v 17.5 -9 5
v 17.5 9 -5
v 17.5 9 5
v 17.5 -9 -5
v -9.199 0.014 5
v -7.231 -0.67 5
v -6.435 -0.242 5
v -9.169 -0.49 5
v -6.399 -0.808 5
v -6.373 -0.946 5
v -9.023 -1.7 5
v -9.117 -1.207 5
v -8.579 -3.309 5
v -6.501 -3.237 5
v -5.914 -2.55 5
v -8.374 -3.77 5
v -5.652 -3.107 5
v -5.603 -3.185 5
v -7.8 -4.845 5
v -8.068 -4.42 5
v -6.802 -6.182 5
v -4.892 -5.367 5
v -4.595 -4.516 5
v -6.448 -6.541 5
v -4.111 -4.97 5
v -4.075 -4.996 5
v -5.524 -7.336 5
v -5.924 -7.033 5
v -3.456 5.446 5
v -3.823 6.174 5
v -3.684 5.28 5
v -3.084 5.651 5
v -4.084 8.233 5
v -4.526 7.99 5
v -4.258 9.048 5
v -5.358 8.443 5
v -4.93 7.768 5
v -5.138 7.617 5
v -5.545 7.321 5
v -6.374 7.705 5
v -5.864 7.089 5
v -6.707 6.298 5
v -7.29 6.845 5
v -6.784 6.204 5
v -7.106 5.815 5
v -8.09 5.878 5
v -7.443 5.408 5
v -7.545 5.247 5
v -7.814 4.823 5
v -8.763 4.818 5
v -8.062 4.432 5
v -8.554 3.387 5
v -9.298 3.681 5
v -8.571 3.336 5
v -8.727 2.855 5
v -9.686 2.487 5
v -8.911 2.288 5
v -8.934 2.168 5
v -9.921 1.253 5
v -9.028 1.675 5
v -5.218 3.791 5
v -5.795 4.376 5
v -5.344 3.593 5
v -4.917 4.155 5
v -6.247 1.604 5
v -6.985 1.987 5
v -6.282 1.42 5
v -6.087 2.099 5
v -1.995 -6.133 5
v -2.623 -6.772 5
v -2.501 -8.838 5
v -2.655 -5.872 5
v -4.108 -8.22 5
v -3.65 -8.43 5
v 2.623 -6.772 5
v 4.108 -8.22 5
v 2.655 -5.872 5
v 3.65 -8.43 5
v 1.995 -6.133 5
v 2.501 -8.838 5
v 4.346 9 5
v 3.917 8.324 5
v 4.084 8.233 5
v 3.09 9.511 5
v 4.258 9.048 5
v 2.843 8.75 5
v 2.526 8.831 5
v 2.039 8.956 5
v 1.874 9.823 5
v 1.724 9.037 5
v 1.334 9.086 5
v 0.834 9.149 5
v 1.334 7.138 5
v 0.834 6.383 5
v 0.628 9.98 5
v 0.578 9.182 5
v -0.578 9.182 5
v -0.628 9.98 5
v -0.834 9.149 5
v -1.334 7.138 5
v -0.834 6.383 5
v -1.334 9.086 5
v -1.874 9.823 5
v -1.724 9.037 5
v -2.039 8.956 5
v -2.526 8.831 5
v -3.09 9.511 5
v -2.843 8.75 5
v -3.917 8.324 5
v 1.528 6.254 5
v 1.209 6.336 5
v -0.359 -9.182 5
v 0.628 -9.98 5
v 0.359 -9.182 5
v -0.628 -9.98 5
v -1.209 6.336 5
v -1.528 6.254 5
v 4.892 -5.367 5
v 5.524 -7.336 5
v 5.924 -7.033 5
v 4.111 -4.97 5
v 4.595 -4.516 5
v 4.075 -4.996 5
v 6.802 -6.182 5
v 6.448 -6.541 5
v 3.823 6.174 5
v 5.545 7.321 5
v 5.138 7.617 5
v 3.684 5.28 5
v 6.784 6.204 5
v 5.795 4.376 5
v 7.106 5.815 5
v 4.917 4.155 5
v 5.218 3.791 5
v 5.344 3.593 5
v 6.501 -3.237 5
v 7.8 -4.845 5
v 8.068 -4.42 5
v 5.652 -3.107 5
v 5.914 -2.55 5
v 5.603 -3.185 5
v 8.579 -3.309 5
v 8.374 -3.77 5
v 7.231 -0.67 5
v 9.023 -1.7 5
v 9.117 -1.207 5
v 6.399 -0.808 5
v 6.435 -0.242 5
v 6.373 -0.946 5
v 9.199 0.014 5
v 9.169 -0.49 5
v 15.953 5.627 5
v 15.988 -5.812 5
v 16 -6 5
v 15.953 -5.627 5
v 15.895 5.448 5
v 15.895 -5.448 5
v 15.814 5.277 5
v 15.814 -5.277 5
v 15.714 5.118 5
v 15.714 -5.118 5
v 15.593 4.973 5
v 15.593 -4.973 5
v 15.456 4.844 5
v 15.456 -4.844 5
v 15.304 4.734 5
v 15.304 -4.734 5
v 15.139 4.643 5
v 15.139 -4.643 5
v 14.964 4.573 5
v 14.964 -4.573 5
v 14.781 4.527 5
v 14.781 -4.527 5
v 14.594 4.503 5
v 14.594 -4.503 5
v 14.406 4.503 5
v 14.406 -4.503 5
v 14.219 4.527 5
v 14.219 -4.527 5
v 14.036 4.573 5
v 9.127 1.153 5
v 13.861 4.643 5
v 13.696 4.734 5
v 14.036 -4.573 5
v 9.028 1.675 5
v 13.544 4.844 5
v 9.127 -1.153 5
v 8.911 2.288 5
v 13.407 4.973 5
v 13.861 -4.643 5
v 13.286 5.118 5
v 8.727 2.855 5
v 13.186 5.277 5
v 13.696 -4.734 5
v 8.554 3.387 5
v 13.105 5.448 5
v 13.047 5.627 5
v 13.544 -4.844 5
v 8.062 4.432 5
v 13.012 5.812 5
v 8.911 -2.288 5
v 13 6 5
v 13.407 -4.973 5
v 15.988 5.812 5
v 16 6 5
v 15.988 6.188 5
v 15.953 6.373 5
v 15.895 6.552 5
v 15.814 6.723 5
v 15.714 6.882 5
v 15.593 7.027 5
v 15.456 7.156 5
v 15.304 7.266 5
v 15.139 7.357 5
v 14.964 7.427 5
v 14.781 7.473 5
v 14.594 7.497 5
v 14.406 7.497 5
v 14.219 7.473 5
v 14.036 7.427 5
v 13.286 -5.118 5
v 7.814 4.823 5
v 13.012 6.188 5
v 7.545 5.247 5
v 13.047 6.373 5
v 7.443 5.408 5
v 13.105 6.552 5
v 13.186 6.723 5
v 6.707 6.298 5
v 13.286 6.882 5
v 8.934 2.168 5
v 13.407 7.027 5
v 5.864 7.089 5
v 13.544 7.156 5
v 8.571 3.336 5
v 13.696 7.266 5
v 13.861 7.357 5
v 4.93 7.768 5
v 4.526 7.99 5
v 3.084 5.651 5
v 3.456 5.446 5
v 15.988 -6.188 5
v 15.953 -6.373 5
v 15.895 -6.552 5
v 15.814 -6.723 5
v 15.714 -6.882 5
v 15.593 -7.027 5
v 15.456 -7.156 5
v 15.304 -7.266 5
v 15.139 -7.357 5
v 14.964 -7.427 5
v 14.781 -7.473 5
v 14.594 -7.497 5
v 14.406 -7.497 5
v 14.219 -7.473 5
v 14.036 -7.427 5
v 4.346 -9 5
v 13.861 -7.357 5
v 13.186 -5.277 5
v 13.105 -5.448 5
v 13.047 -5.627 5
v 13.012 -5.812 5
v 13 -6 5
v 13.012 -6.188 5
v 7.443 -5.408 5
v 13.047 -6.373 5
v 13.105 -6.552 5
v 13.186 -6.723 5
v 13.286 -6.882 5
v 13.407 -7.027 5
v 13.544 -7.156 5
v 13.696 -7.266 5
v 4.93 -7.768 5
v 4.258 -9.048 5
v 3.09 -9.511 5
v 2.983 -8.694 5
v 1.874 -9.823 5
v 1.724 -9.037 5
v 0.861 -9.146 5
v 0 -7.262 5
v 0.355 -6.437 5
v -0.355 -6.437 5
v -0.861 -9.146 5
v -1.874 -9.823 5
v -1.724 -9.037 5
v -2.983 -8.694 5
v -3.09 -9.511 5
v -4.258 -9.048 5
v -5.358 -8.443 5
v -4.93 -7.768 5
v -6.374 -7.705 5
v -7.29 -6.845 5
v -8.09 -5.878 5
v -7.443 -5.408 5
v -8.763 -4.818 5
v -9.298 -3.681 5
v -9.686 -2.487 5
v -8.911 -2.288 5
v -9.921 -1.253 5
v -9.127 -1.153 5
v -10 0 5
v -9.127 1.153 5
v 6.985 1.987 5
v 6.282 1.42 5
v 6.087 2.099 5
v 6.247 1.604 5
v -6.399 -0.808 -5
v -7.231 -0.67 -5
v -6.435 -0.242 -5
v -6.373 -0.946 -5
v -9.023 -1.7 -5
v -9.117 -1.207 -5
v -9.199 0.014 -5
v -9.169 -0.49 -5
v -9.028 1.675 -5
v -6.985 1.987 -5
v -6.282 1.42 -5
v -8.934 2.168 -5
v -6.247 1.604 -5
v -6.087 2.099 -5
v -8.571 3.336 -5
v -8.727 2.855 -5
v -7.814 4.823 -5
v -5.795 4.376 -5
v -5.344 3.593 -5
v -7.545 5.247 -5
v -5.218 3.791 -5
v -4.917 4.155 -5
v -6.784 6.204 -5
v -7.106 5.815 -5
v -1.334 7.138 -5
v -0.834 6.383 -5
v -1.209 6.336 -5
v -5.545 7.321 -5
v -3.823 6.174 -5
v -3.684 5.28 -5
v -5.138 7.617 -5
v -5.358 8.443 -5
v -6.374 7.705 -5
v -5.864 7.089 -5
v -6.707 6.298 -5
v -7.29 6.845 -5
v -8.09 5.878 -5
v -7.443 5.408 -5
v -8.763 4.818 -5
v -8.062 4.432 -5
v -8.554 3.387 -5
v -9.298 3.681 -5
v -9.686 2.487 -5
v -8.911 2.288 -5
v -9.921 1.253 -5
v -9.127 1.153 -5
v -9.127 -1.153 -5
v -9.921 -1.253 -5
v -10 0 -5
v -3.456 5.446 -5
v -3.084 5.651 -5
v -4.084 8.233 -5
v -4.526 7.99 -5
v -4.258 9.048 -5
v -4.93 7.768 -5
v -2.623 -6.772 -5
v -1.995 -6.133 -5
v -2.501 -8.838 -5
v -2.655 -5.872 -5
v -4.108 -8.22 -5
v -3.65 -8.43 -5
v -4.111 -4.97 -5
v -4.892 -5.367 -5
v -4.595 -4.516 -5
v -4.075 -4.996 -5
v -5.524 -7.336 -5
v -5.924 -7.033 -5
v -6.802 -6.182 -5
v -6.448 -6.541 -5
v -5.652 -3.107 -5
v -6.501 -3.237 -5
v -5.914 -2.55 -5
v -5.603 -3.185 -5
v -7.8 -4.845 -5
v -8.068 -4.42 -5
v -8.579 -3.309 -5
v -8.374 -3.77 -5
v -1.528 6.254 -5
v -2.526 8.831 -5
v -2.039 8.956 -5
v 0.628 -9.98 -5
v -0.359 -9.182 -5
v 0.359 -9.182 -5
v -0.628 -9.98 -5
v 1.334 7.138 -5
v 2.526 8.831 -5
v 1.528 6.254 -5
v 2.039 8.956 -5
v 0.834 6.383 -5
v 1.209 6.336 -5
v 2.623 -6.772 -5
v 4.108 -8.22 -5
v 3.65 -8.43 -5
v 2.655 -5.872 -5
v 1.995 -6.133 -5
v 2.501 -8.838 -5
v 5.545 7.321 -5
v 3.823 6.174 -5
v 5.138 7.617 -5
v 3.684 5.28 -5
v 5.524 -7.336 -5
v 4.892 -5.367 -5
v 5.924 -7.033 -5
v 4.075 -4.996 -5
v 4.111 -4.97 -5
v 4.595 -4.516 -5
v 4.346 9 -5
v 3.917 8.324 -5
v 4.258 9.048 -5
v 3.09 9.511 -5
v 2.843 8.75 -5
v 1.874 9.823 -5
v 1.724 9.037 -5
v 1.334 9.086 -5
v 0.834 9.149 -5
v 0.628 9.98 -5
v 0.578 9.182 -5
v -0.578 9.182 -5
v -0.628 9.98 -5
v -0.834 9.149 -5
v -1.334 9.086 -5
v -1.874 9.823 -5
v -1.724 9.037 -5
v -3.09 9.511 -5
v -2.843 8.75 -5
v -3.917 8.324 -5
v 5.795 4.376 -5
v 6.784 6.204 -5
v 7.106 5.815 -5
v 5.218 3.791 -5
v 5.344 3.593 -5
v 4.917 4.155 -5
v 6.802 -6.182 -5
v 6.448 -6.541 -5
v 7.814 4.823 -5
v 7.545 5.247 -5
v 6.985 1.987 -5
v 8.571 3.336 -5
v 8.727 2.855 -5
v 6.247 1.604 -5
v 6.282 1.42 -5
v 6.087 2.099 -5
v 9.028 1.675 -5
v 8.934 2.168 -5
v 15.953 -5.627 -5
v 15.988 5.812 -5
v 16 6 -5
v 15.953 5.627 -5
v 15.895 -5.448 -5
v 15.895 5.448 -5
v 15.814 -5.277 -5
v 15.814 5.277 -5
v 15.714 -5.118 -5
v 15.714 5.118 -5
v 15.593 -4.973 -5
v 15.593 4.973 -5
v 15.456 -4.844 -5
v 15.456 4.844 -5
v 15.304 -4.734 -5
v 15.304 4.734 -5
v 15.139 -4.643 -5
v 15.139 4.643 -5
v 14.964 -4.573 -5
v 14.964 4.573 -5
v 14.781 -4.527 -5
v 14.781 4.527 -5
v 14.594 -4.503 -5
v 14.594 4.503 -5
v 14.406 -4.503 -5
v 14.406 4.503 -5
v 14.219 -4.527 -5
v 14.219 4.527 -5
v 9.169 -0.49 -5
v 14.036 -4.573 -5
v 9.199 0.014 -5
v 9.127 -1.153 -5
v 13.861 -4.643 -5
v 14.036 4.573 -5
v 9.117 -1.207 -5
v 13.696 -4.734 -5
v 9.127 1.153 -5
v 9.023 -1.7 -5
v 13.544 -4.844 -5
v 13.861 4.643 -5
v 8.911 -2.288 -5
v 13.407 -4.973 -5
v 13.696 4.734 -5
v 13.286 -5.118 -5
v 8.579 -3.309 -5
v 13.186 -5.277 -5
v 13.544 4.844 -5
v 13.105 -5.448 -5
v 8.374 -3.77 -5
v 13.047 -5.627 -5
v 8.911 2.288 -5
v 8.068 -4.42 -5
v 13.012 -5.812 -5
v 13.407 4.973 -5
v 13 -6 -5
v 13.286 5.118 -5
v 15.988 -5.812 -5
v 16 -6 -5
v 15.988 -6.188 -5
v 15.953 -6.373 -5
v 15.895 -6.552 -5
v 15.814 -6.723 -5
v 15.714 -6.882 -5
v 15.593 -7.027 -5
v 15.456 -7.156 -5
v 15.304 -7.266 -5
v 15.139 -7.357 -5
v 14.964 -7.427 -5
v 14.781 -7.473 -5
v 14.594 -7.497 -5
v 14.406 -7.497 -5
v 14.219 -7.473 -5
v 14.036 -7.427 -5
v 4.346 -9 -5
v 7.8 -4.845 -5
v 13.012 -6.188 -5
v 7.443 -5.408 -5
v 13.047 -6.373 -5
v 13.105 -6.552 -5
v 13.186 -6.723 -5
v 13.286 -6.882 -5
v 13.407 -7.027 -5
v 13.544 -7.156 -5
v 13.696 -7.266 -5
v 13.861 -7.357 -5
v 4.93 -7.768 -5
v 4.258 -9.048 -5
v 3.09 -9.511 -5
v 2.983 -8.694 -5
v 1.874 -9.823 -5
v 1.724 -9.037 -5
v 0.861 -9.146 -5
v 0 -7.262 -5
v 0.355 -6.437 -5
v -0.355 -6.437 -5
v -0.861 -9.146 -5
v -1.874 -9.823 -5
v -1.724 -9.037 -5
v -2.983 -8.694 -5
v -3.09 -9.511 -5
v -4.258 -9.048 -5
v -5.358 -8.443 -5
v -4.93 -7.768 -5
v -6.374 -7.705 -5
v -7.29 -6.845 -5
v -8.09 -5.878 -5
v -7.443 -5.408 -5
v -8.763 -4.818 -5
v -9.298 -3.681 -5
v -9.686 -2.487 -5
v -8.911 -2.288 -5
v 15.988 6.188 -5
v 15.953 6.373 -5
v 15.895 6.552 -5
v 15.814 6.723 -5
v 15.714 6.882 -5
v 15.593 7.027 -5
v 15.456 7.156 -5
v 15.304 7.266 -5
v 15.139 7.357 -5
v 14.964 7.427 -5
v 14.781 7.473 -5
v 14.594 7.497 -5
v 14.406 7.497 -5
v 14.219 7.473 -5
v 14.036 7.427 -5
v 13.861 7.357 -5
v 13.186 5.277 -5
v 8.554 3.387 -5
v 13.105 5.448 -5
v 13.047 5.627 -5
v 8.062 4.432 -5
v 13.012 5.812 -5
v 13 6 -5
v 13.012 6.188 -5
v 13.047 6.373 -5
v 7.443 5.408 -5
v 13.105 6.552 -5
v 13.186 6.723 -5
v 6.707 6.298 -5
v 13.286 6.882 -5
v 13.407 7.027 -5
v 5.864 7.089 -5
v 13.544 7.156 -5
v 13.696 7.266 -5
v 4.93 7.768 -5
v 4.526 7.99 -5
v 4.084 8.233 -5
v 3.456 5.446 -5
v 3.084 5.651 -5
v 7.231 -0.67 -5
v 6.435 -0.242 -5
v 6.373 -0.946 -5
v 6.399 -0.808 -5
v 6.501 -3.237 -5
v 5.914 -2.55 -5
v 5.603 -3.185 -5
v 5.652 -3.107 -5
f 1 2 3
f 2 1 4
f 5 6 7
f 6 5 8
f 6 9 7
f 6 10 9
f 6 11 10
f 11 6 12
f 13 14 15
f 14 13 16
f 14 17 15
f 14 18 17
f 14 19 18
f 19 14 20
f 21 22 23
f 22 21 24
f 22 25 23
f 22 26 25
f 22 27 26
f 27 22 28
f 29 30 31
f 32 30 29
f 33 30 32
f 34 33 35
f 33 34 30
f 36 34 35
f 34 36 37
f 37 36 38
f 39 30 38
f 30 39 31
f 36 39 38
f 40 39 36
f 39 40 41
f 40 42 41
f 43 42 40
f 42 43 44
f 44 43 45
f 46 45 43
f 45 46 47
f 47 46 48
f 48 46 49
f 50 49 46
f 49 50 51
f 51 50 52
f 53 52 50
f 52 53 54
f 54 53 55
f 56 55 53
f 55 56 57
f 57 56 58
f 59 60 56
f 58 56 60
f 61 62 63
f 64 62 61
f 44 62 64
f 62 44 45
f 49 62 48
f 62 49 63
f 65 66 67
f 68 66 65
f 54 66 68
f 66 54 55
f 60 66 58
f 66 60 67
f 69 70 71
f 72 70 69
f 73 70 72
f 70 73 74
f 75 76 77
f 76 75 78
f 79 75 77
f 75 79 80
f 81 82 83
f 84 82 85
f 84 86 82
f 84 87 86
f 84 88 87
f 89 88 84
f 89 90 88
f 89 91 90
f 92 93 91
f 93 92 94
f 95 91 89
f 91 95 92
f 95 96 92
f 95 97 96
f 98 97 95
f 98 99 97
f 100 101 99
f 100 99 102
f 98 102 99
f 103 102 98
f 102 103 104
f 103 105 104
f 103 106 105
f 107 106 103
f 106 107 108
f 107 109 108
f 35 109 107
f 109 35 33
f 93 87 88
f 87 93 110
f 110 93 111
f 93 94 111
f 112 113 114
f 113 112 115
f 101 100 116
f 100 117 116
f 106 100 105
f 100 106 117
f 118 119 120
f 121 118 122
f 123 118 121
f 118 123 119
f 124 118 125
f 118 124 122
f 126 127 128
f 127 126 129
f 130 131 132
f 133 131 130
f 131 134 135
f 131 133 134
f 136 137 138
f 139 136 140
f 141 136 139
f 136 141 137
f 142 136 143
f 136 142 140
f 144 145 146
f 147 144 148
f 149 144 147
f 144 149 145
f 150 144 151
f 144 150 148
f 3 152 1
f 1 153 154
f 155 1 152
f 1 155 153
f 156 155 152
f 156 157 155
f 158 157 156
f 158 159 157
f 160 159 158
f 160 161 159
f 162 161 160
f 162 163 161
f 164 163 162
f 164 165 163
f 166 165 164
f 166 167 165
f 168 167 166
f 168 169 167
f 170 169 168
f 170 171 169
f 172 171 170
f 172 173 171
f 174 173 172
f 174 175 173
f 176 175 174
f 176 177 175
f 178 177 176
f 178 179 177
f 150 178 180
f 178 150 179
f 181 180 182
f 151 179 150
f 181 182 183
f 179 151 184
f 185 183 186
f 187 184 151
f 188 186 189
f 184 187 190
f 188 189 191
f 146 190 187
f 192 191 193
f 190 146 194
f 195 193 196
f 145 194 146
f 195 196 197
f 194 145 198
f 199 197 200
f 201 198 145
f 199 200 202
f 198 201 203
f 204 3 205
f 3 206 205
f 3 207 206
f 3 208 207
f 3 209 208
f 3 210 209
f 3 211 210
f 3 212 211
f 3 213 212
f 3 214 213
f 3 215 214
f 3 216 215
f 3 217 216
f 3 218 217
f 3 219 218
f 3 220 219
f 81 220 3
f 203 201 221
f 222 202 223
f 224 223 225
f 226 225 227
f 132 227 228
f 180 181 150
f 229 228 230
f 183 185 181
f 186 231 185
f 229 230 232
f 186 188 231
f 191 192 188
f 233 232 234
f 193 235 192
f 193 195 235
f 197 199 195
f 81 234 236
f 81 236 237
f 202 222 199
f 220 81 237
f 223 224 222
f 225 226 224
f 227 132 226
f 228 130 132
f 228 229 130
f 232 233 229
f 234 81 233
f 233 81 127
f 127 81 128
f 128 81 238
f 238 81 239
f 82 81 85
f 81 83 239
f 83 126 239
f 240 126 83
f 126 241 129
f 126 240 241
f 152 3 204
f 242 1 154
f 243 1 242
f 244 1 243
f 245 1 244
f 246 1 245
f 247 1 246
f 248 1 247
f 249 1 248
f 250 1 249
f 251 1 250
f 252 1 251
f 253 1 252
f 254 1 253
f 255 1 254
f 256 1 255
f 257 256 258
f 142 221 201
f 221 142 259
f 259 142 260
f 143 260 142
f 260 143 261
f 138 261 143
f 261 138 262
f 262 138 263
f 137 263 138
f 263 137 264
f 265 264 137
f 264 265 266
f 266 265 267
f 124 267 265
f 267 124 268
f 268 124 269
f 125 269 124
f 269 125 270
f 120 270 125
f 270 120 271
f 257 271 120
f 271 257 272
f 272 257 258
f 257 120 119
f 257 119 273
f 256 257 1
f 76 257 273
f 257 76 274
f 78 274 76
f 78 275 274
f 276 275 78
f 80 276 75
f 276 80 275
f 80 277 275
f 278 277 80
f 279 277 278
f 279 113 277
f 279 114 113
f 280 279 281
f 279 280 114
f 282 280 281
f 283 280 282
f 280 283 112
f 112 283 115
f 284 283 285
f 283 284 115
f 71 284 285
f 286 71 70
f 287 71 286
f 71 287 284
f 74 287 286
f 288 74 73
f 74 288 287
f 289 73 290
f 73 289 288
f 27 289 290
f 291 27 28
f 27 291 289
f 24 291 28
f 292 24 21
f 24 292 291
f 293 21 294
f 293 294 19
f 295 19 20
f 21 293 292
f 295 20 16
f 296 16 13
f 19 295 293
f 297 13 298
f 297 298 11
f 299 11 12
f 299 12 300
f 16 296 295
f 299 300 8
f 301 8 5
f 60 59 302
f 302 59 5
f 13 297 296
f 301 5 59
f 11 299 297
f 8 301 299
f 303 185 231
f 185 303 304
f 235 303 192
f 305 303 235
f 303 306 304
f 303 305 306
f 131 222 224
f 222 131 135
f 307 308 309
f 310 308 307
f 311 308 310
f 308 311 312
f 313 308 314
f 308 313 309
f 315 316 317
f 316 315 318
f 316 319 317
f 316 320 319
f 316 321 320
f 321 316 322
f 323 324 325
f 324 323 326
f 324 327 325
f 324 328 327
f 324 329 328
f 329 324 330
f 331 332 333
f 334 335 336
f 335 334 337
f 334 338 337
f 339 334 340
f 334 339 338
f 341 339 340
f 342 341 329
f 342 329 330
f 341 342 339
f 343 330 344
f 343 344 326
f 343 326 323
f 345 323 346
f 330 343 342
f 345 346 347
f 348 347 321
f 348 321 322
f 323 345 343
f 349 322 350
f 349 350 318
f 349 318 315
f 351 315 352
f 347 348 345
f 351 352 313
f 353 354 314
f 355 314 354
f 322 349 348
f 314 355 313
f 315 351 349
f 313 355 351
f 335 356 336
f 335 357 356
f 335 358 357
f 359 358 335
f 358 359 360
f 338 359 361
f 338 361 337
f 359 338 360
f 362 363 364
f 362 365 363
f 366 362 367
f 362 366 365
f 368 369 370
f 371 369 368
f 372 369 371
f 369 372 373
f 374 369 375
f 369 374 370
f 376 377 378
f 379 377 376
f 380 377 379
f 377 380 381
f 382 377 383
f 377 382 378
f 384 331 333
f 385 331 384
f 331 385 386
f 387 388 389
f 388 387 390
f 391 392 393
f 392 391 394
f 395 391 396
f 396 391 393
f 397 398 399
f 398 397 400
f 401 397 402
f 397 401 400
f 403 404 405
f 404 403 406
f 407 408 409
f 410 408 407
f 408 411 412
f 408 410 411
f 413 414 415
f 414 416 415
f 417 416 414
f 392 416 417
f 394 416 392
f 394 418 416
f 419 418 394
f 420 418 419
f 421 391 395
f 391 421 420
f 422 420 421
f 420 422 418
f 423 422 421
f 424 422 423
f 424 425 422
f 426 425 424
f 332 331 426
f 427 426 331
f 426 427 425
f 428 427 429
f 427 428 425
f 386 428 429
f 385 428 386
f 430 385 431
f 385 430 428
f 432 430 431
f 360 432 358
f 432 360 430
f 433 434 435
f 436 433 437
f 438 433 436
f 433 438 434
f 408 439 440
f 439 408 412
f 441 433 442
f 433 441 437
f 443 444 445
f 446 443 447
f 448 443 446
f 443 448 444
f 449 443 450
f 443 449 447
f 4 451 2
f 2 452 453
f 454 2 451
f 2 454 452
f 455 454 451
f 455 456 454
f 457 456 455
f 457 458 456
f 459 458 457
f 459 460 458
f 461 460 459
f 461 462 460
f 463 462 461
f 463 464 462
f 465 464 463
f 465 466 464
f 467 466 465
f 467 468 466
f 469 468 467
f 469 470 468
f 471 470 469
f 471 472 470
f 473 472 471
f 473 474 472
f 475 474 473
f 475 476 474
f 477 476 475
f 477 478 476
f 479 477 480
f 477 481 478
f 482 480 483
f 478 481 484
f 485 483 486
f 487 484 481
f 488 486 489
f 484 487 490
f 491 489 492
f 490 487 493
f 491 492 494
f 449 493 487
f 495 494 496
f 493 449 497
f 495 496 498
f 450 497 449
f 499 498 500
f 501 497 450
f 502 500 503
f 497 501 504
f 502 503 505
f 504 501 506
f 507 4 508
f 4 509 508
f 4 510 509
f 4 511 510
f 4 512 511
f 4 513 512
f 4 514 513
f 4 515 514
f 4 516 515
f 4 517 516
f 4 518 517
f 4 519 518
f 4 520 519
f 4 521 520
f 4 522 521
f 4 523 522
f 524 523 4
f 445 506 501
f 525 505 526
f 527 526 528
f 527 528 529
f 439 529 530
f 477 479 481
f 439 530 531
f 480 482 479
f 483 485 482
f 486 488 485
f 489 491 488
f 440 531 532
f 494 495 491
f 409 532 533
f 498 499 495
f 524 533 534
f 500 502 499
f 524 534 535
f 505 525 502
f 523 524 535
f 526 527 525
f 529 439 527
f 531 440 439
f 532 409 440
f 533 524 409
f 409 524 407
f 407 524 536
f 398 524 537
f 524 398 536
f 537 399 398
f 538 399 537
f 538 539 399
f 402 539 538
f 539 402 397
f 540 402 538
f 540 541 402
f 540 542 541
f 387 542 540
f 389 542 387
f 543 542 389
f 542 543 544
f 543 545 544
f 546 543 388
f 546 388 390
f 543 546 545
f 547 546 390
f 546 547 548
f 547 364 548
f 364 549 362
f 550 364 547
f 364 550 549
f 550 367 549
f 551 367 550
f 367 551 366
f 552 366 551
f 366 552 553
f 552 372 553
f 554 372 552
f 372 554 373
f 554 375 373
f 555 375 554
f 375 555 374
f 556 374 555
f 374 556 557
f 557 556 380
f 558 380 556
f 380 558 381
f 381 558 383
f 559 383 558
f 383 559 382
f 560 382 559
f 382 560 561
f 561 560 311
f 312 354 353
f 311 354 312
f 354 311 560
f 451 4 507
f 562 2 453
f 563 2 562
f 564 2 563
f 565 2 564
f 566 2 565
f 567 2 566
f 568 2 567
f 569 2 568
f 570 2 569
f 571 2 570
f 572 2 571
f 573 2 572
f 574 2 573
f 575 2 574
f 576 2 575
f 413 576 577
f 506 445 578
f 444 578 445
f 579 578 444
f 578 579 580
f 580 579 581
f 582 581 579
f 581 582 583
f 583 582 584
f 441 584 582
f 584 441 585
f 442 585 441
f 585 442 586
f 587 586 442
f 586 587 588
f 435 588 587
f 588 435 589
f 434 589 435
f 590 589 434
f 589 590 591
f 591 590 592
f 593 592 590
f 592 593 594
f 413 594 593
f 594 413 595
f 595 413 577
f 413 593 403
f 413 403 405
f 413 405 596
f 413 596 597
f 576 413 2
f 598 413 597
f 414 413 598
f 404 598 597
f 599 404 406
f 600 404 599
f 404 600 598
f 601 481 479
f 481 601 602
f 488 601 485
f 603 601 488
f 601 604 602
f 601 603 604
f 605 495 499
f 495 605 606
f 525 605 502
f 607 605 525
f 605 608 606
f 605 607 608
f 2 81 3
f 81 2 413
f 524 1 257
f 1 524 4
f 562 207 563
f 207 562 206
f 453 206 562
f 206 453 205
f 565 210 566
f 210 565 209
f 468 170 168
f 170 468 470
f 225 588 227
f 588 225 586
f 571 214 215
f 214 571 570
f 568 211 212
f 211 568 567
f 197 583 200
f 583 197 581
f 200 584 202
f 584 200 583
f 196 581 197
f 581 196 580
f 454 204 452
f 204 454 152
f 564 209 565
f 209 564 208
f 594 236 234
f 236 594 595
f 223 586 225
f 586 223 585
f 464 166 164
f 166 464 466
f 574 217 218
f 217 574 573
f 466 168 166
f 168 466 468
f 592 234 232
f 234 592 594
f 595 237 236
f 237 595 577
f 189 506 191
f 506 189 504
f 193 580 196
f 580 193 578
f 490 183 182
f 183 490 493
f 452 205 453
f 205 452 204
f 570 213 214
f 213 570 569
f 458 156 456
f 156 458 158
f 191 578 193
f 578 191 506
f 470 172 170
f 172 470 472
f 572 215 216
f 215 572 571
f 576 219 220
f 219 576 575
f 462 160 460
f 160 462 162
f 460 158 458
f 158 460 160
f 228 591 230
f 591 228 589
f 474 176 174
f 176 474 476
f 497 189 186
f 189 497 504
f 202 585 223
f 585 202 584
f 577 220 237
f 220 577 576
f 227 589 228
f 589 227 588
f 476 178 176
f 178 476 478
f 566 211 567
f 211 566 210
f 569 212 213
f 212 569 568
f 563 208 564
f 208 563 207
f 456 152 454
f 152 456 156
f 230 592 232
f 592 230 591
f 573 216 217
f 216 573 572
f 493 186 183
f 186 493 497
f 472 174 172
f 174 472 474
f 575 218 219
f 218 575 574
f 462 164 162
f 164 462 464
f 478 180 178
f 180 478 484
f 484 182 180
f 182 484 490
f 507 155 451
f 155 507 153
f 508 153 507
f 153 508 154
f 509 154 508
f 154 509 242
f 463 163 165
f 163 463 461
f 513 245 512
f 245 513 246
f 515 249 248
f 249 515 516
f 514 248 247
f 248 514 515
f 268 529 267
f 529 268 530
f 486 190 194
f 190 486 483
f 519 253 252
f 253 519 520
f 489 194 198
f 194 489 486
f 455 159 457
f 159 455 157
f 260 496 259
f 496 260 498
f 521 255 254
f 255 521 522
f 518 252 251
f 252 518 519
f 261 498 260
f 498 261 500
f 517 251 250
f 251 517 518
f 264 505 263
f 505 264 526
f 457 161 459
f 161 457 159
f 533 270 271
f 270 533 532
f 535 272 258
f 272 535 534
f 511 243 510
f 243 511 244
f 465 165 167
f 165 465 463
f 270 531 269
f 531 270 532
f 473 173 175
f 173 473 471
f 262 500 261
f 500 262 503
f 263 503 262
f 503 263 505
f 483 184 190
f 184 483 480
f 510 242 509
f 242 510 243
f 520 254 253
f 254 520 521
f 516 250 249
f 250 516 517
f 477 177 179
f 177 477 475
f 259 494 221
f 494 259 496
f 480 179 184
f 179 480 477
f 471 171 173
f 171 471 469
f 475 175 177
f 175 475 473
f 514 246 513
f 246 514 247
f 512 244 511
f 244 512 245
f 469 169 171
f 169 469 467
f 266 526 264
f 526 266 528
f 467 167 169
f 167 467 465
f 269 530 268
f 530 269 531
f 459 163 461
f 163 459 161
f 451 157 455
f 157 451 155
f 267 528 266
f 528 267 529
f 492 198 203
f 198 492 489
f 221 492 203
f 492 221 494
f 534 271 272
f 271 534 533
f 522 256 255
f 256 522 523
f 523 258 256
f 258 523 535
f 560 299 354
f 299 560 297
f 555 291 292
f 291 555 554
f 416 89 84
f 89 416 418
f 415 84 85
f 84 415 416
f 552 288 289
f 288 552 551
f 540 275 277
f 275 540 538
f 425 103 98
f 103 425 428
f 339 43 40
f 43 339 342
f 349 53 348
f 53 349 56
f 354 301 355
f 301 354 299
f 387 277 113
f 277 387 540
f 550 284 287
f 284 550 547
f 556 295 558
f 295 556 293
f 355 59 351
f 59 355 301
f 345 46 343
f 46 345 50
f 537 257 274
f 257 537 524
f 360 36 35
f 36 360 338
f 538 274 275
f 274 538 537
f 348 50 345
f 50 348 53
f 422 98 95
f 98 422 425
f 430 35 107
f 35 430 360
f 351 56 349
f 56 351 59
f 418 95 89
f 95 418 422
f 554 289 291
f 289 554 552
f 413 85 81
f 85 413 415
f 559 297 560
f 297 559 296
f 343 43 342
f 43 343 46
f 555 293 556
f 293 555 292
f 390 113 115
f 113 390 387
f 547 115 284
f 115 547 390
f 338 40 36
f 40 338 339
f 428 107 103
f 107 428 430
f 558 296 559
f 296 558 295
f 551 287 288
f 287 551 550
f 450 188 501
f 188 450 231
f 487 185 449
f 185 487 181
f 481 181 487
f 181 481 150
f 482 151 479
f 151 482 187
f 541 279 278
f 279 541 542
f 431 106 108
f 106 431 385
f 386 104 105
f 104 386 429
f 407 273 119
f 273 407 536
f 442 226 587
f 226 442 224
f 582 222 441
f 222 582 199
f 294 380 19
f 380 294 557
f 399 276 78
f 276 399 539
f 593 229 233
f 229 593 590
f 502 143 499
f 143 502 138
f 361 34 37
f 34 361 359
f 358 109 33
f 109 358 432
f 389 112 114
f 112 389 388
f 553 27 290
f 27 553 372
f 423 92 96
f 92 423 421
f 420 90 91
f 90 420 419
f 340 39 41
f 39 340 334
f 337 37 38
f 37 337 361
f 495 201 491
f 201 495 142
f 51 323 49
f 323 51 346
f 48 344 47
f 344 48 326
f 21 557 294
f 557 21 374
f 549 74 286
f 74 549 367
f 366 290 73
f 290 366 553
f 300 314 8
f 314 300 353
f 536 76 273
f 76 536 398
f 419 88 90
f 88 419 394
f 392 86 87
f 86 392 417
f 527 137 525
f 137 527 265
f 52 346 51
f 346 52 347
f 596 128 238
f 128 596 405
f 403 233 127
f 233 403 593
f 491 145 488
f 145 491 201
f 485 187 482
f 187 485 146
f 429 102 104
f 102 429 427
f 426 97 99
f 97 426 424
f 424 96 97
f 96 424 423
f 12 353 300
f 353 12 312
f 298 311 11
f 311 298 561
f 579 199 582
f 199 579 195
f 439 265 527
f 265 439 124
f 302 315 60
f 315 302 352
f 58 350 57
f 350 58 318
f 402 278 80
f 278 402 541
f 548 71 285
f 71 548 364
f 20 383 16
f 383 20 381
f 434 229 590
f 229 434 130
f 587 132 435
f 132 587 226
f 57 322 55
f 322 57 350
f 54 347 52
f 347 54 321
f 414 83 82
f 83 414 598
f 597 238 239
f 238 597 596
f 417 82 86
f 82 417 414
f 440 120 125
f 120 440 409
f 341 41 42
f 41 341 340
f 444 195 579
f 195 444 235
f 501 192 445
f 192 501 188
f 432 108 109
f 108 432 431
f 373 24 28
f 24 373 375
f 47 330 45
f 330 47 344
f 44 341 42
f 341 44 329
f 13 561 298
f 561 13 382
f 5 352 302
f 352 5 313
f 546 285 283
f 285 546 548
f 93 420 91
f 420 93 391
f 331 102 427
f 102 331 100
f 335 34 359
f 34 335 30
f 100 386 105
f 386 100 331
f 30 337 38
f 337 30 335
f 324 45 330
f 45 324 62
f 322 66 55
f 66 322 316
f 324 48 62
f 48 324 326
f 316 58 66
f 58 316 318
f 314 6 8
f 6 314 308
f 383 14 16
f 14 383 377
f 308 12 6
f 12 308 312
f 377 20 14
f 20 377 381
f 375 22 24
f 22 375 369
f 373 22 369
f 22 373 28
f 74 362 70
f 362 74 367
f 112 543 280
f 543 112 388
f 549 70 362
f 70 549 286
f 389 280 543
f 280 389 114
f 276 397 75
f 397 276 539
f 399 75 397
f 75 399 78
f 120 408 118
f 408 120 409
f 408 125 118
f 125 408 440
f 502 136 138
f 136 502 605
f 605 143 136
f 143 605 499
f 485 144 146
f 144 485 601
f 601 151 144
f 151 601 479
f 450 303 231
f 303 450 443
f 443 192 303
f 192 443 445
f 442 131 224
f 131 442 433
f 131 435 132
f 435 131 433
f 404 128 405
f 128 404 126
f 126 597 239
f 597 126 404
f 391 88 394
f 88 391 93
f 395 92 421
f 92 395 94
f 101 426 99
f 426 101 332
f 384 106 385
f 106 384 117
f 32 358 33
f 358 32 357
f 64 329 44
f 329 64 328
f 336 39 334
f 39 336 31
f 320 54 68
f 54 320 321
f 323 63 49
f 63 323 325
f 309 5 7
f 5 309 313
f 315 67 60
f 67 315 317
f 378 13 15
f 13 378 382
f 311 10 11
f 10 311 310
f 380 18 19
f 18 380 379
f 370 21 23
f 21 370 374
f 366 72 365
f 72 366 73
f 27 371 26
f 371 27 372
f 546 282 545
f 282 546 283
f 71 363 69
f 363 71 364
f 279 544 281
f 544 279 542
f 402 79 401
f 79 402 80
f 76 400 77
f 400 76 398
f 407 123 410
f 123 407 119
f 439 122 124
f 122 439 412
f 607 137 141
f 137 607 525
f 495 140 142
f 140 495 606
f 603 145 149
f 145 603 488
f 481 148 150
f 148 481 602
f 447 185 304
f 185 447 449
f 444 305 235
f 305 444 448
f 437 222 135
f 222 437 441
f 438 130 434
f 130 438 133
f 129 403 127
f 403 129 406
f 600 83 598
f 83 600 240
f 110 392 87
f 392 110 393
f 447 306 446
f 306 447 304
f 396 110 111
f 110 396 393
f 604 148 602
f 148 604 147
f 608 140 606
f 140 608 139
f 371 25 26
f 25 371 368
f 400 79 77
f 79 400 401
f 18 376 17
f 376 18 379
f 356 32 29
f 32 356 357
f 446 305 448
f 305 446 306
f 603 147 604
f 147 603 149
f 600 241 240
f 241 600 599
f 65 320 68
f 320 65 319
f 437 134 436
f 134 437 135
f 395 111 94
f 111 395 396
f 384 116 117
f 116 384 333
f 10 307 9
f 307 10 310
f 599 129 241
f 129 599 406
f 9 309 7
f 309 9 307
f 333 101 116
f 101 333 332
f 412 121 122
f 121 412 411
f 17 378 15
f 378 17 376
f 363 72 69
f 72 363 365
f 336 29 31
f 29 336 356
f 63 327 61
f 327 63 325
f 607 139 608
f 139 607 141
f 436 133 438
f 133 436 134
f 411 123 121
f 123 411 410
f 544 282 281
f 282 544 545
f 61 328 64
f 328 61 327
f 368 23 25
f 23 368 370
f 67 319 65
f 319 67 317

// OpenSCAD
/* toothedLinearBearing
 * Copyright (c) 2012 by Krallinger Sebastian [s.krallinger+cc@gmail.com]
 * Dual-licensed under
 * Creative Commons Attribution-ShareAlike 3.0 (CC BY-SA) [http://creativecommons.org/licenses/by-sa/3.0/]
 * and
 * GPL v2 or later [http://www.gnu.org/licenses/].
 */

/* necessary libs:
 * https://github.com/kr2/MCAD
 */


// ************* units.scad ************* //




mm = 1;
cm = 10 * mm;
dm = 100 * mm;
m = 1000 * mm;

inch = 25.4 * mm;

X = [1, 0, 0];
Y = [0, 1, 0];
Z = [0, 0, 1];

M3 = 3*mm;
M4 = 4*mm;
M5 = 5*mm;
M6 = 6*mm;
M8 = 8*mm;



epsilon = 0.01*mm;
OS = epsilon;

// ************* toothedLinearBearing.scad ************* //


/**
* @brief   Toothed Linear Bearing (TLB).
*
* Linear Bearing with parallel triagnles towards the center.
* @param  inner_d     Inner diameter (Axis Diameter)
* @param  outer_d     outer diameter (holder Diameter)
* @param  h         height
* @param  stringWidth   width of an single string of your printer (this defines the width of the tooth walls)
* @param  minWallThickness   minimum thickness of the outer wall.
* @param  tooths      number of toohts on the innside
* @param  toothRatio    coverd length of the inner ring
**/
$fn =50;
module TLB_linearBearing(
              inner_d          = 12.9,
              outer_d          = 15,
              h                = 24,
              stringWidth      = 0.5,
              minWallThickness = 0.85,
              tooths           = 16,
              toothRatio       = 0.25
            ) {

  stringWidth          = stringWidth; //!< the layer width of one string

  TLB_innerD           = inner_d;
  TLB_outerD           = outer_d;
  TLB_minWallThickness = minWallThickness;
  TLB_h                = h;
  TLB_tooths           = tooths;

  TLB_toothRate        = toothRatio;


  gapWidth             = (TLB_innerD*PI)/TLB_tooths *TLB_toothRate;
  //echo(str("gap Width: ", gapWidth));
  middR                = TLB_outerD/2- TLB_minWallThickness;

  //outer ring
  difference() {
    cylinder(r=TLB_outerD/2, h=TLB_h, center=true);
    cylinder(r=middR, h=TLB_h+2*OS, center=true);
  }


  difference() {
    union(){
      cylinder(r=TLB_innerD/2 + stringWidth, h=TLB_h, center=true);

      for (i=[0:360 / TLB_tooths : 360]) {
        rotate(a=i,v=Z) translate([-(gapWidth+2*stringWidth)/2, 0, -TLB_h/2])
          cube(size=[gapWidth+2*stringWidth, middR+OS, TLB_h], center=false);
      }
    }
    union(){
      cylinder(r=TLB_innerD/2, h=TLB_h+2*OS, center=true);

      for (i=[0:360 / TLB_tooths : 360]) {
        rotate(a=i,v=Z) translate([-gapWidth/2, 0, -TLB_h/2-OS])
          cube(size=[gapWidth, middR, TLB_h+2*OS], center=false);
      }
    }
  }

}

module TLB_test() {
  TLB_linearBearing(
              inner_d          = 8,
              outer_d          = 15,
              h                = 24,
              stringWidth      = 0.5,
              minWallThickness = 0.85,
              tooths           = 16,
              toothRatio       = 0.25
            );
  translate([30, 0, 0])
  TLB_linearBearing(
              inner_d          = 8,
              outer_d          = 20,
              h                = 12,
              stringWidth      = 0.5,
              minWallThickness = 3,
              tooths           = 4,
              toothRatio       = 0.25
            );

  translate([60, 0, 0])
  TLB_linearBearing(
              inner_d          = 12,
              outer_d          = 26,
              h                = 6,
              stringWidth      = 1.5,
              minWallThickness = 3,
              tooths           = 7,
              toothRatio       = 0.6
            );
}
//TLB_test();


module TLB_print(s = 4) {
  $fn =100;
  dist = 2;
  translate([-s*(15+dist)/2-15/2, -s*(15+dist)/2, 0])
  for (x=[1:s]) {
    for (y=[1:s]) {
      if (y%2) {
        translate([x*(15+ dist)+15/2, y*(15*4/5 +dist), 0])
          TLB_linearBearing(
              inner_d          = 8,
              outer_d          = 15,
              h                = 24,
              stringWidth      = 0.5,
              minWallThickness = 0.85,
              tooths           = 16,
              toothRatio       = 0.25);
      }else{
        translate([x*(15 +dist) -dist/2, y*(15*4/5 +dist), 0])
          TLB_linearBearing(
              inner_d          = 8,
              outer_d          = 15,
              h                = 24,
              stringWidth      = 0.5,
              minWallThickness = 0.85,
              tooths           = 16,
              toothRatio       = 0.25);
      }
    }
  }
}
//TLB_print(s = 4);

color("Red")
translate([5,0,0])
difference() {
  translate([5,0,0]) cube(size=[15, 18, 10], center=true);
  translate([-5,0,0]) cylinder(r=9.8, h=11, center=true);
  translate([9.5,6,0]) cylinder(r=1.5, h=12, center=true);
  translate([9.5,-6,0]) cylinder(r=1.5, h=12, center=true);
}



          TLB_linearBearing(
              inner_d          = 12.9,
              outer_d          = 20,
              h                = 10,
              stringWidth      = 0.5,
              minWallThickness = 0.8,
              tooths           = 17,
              toothRatio       = 0.7);
